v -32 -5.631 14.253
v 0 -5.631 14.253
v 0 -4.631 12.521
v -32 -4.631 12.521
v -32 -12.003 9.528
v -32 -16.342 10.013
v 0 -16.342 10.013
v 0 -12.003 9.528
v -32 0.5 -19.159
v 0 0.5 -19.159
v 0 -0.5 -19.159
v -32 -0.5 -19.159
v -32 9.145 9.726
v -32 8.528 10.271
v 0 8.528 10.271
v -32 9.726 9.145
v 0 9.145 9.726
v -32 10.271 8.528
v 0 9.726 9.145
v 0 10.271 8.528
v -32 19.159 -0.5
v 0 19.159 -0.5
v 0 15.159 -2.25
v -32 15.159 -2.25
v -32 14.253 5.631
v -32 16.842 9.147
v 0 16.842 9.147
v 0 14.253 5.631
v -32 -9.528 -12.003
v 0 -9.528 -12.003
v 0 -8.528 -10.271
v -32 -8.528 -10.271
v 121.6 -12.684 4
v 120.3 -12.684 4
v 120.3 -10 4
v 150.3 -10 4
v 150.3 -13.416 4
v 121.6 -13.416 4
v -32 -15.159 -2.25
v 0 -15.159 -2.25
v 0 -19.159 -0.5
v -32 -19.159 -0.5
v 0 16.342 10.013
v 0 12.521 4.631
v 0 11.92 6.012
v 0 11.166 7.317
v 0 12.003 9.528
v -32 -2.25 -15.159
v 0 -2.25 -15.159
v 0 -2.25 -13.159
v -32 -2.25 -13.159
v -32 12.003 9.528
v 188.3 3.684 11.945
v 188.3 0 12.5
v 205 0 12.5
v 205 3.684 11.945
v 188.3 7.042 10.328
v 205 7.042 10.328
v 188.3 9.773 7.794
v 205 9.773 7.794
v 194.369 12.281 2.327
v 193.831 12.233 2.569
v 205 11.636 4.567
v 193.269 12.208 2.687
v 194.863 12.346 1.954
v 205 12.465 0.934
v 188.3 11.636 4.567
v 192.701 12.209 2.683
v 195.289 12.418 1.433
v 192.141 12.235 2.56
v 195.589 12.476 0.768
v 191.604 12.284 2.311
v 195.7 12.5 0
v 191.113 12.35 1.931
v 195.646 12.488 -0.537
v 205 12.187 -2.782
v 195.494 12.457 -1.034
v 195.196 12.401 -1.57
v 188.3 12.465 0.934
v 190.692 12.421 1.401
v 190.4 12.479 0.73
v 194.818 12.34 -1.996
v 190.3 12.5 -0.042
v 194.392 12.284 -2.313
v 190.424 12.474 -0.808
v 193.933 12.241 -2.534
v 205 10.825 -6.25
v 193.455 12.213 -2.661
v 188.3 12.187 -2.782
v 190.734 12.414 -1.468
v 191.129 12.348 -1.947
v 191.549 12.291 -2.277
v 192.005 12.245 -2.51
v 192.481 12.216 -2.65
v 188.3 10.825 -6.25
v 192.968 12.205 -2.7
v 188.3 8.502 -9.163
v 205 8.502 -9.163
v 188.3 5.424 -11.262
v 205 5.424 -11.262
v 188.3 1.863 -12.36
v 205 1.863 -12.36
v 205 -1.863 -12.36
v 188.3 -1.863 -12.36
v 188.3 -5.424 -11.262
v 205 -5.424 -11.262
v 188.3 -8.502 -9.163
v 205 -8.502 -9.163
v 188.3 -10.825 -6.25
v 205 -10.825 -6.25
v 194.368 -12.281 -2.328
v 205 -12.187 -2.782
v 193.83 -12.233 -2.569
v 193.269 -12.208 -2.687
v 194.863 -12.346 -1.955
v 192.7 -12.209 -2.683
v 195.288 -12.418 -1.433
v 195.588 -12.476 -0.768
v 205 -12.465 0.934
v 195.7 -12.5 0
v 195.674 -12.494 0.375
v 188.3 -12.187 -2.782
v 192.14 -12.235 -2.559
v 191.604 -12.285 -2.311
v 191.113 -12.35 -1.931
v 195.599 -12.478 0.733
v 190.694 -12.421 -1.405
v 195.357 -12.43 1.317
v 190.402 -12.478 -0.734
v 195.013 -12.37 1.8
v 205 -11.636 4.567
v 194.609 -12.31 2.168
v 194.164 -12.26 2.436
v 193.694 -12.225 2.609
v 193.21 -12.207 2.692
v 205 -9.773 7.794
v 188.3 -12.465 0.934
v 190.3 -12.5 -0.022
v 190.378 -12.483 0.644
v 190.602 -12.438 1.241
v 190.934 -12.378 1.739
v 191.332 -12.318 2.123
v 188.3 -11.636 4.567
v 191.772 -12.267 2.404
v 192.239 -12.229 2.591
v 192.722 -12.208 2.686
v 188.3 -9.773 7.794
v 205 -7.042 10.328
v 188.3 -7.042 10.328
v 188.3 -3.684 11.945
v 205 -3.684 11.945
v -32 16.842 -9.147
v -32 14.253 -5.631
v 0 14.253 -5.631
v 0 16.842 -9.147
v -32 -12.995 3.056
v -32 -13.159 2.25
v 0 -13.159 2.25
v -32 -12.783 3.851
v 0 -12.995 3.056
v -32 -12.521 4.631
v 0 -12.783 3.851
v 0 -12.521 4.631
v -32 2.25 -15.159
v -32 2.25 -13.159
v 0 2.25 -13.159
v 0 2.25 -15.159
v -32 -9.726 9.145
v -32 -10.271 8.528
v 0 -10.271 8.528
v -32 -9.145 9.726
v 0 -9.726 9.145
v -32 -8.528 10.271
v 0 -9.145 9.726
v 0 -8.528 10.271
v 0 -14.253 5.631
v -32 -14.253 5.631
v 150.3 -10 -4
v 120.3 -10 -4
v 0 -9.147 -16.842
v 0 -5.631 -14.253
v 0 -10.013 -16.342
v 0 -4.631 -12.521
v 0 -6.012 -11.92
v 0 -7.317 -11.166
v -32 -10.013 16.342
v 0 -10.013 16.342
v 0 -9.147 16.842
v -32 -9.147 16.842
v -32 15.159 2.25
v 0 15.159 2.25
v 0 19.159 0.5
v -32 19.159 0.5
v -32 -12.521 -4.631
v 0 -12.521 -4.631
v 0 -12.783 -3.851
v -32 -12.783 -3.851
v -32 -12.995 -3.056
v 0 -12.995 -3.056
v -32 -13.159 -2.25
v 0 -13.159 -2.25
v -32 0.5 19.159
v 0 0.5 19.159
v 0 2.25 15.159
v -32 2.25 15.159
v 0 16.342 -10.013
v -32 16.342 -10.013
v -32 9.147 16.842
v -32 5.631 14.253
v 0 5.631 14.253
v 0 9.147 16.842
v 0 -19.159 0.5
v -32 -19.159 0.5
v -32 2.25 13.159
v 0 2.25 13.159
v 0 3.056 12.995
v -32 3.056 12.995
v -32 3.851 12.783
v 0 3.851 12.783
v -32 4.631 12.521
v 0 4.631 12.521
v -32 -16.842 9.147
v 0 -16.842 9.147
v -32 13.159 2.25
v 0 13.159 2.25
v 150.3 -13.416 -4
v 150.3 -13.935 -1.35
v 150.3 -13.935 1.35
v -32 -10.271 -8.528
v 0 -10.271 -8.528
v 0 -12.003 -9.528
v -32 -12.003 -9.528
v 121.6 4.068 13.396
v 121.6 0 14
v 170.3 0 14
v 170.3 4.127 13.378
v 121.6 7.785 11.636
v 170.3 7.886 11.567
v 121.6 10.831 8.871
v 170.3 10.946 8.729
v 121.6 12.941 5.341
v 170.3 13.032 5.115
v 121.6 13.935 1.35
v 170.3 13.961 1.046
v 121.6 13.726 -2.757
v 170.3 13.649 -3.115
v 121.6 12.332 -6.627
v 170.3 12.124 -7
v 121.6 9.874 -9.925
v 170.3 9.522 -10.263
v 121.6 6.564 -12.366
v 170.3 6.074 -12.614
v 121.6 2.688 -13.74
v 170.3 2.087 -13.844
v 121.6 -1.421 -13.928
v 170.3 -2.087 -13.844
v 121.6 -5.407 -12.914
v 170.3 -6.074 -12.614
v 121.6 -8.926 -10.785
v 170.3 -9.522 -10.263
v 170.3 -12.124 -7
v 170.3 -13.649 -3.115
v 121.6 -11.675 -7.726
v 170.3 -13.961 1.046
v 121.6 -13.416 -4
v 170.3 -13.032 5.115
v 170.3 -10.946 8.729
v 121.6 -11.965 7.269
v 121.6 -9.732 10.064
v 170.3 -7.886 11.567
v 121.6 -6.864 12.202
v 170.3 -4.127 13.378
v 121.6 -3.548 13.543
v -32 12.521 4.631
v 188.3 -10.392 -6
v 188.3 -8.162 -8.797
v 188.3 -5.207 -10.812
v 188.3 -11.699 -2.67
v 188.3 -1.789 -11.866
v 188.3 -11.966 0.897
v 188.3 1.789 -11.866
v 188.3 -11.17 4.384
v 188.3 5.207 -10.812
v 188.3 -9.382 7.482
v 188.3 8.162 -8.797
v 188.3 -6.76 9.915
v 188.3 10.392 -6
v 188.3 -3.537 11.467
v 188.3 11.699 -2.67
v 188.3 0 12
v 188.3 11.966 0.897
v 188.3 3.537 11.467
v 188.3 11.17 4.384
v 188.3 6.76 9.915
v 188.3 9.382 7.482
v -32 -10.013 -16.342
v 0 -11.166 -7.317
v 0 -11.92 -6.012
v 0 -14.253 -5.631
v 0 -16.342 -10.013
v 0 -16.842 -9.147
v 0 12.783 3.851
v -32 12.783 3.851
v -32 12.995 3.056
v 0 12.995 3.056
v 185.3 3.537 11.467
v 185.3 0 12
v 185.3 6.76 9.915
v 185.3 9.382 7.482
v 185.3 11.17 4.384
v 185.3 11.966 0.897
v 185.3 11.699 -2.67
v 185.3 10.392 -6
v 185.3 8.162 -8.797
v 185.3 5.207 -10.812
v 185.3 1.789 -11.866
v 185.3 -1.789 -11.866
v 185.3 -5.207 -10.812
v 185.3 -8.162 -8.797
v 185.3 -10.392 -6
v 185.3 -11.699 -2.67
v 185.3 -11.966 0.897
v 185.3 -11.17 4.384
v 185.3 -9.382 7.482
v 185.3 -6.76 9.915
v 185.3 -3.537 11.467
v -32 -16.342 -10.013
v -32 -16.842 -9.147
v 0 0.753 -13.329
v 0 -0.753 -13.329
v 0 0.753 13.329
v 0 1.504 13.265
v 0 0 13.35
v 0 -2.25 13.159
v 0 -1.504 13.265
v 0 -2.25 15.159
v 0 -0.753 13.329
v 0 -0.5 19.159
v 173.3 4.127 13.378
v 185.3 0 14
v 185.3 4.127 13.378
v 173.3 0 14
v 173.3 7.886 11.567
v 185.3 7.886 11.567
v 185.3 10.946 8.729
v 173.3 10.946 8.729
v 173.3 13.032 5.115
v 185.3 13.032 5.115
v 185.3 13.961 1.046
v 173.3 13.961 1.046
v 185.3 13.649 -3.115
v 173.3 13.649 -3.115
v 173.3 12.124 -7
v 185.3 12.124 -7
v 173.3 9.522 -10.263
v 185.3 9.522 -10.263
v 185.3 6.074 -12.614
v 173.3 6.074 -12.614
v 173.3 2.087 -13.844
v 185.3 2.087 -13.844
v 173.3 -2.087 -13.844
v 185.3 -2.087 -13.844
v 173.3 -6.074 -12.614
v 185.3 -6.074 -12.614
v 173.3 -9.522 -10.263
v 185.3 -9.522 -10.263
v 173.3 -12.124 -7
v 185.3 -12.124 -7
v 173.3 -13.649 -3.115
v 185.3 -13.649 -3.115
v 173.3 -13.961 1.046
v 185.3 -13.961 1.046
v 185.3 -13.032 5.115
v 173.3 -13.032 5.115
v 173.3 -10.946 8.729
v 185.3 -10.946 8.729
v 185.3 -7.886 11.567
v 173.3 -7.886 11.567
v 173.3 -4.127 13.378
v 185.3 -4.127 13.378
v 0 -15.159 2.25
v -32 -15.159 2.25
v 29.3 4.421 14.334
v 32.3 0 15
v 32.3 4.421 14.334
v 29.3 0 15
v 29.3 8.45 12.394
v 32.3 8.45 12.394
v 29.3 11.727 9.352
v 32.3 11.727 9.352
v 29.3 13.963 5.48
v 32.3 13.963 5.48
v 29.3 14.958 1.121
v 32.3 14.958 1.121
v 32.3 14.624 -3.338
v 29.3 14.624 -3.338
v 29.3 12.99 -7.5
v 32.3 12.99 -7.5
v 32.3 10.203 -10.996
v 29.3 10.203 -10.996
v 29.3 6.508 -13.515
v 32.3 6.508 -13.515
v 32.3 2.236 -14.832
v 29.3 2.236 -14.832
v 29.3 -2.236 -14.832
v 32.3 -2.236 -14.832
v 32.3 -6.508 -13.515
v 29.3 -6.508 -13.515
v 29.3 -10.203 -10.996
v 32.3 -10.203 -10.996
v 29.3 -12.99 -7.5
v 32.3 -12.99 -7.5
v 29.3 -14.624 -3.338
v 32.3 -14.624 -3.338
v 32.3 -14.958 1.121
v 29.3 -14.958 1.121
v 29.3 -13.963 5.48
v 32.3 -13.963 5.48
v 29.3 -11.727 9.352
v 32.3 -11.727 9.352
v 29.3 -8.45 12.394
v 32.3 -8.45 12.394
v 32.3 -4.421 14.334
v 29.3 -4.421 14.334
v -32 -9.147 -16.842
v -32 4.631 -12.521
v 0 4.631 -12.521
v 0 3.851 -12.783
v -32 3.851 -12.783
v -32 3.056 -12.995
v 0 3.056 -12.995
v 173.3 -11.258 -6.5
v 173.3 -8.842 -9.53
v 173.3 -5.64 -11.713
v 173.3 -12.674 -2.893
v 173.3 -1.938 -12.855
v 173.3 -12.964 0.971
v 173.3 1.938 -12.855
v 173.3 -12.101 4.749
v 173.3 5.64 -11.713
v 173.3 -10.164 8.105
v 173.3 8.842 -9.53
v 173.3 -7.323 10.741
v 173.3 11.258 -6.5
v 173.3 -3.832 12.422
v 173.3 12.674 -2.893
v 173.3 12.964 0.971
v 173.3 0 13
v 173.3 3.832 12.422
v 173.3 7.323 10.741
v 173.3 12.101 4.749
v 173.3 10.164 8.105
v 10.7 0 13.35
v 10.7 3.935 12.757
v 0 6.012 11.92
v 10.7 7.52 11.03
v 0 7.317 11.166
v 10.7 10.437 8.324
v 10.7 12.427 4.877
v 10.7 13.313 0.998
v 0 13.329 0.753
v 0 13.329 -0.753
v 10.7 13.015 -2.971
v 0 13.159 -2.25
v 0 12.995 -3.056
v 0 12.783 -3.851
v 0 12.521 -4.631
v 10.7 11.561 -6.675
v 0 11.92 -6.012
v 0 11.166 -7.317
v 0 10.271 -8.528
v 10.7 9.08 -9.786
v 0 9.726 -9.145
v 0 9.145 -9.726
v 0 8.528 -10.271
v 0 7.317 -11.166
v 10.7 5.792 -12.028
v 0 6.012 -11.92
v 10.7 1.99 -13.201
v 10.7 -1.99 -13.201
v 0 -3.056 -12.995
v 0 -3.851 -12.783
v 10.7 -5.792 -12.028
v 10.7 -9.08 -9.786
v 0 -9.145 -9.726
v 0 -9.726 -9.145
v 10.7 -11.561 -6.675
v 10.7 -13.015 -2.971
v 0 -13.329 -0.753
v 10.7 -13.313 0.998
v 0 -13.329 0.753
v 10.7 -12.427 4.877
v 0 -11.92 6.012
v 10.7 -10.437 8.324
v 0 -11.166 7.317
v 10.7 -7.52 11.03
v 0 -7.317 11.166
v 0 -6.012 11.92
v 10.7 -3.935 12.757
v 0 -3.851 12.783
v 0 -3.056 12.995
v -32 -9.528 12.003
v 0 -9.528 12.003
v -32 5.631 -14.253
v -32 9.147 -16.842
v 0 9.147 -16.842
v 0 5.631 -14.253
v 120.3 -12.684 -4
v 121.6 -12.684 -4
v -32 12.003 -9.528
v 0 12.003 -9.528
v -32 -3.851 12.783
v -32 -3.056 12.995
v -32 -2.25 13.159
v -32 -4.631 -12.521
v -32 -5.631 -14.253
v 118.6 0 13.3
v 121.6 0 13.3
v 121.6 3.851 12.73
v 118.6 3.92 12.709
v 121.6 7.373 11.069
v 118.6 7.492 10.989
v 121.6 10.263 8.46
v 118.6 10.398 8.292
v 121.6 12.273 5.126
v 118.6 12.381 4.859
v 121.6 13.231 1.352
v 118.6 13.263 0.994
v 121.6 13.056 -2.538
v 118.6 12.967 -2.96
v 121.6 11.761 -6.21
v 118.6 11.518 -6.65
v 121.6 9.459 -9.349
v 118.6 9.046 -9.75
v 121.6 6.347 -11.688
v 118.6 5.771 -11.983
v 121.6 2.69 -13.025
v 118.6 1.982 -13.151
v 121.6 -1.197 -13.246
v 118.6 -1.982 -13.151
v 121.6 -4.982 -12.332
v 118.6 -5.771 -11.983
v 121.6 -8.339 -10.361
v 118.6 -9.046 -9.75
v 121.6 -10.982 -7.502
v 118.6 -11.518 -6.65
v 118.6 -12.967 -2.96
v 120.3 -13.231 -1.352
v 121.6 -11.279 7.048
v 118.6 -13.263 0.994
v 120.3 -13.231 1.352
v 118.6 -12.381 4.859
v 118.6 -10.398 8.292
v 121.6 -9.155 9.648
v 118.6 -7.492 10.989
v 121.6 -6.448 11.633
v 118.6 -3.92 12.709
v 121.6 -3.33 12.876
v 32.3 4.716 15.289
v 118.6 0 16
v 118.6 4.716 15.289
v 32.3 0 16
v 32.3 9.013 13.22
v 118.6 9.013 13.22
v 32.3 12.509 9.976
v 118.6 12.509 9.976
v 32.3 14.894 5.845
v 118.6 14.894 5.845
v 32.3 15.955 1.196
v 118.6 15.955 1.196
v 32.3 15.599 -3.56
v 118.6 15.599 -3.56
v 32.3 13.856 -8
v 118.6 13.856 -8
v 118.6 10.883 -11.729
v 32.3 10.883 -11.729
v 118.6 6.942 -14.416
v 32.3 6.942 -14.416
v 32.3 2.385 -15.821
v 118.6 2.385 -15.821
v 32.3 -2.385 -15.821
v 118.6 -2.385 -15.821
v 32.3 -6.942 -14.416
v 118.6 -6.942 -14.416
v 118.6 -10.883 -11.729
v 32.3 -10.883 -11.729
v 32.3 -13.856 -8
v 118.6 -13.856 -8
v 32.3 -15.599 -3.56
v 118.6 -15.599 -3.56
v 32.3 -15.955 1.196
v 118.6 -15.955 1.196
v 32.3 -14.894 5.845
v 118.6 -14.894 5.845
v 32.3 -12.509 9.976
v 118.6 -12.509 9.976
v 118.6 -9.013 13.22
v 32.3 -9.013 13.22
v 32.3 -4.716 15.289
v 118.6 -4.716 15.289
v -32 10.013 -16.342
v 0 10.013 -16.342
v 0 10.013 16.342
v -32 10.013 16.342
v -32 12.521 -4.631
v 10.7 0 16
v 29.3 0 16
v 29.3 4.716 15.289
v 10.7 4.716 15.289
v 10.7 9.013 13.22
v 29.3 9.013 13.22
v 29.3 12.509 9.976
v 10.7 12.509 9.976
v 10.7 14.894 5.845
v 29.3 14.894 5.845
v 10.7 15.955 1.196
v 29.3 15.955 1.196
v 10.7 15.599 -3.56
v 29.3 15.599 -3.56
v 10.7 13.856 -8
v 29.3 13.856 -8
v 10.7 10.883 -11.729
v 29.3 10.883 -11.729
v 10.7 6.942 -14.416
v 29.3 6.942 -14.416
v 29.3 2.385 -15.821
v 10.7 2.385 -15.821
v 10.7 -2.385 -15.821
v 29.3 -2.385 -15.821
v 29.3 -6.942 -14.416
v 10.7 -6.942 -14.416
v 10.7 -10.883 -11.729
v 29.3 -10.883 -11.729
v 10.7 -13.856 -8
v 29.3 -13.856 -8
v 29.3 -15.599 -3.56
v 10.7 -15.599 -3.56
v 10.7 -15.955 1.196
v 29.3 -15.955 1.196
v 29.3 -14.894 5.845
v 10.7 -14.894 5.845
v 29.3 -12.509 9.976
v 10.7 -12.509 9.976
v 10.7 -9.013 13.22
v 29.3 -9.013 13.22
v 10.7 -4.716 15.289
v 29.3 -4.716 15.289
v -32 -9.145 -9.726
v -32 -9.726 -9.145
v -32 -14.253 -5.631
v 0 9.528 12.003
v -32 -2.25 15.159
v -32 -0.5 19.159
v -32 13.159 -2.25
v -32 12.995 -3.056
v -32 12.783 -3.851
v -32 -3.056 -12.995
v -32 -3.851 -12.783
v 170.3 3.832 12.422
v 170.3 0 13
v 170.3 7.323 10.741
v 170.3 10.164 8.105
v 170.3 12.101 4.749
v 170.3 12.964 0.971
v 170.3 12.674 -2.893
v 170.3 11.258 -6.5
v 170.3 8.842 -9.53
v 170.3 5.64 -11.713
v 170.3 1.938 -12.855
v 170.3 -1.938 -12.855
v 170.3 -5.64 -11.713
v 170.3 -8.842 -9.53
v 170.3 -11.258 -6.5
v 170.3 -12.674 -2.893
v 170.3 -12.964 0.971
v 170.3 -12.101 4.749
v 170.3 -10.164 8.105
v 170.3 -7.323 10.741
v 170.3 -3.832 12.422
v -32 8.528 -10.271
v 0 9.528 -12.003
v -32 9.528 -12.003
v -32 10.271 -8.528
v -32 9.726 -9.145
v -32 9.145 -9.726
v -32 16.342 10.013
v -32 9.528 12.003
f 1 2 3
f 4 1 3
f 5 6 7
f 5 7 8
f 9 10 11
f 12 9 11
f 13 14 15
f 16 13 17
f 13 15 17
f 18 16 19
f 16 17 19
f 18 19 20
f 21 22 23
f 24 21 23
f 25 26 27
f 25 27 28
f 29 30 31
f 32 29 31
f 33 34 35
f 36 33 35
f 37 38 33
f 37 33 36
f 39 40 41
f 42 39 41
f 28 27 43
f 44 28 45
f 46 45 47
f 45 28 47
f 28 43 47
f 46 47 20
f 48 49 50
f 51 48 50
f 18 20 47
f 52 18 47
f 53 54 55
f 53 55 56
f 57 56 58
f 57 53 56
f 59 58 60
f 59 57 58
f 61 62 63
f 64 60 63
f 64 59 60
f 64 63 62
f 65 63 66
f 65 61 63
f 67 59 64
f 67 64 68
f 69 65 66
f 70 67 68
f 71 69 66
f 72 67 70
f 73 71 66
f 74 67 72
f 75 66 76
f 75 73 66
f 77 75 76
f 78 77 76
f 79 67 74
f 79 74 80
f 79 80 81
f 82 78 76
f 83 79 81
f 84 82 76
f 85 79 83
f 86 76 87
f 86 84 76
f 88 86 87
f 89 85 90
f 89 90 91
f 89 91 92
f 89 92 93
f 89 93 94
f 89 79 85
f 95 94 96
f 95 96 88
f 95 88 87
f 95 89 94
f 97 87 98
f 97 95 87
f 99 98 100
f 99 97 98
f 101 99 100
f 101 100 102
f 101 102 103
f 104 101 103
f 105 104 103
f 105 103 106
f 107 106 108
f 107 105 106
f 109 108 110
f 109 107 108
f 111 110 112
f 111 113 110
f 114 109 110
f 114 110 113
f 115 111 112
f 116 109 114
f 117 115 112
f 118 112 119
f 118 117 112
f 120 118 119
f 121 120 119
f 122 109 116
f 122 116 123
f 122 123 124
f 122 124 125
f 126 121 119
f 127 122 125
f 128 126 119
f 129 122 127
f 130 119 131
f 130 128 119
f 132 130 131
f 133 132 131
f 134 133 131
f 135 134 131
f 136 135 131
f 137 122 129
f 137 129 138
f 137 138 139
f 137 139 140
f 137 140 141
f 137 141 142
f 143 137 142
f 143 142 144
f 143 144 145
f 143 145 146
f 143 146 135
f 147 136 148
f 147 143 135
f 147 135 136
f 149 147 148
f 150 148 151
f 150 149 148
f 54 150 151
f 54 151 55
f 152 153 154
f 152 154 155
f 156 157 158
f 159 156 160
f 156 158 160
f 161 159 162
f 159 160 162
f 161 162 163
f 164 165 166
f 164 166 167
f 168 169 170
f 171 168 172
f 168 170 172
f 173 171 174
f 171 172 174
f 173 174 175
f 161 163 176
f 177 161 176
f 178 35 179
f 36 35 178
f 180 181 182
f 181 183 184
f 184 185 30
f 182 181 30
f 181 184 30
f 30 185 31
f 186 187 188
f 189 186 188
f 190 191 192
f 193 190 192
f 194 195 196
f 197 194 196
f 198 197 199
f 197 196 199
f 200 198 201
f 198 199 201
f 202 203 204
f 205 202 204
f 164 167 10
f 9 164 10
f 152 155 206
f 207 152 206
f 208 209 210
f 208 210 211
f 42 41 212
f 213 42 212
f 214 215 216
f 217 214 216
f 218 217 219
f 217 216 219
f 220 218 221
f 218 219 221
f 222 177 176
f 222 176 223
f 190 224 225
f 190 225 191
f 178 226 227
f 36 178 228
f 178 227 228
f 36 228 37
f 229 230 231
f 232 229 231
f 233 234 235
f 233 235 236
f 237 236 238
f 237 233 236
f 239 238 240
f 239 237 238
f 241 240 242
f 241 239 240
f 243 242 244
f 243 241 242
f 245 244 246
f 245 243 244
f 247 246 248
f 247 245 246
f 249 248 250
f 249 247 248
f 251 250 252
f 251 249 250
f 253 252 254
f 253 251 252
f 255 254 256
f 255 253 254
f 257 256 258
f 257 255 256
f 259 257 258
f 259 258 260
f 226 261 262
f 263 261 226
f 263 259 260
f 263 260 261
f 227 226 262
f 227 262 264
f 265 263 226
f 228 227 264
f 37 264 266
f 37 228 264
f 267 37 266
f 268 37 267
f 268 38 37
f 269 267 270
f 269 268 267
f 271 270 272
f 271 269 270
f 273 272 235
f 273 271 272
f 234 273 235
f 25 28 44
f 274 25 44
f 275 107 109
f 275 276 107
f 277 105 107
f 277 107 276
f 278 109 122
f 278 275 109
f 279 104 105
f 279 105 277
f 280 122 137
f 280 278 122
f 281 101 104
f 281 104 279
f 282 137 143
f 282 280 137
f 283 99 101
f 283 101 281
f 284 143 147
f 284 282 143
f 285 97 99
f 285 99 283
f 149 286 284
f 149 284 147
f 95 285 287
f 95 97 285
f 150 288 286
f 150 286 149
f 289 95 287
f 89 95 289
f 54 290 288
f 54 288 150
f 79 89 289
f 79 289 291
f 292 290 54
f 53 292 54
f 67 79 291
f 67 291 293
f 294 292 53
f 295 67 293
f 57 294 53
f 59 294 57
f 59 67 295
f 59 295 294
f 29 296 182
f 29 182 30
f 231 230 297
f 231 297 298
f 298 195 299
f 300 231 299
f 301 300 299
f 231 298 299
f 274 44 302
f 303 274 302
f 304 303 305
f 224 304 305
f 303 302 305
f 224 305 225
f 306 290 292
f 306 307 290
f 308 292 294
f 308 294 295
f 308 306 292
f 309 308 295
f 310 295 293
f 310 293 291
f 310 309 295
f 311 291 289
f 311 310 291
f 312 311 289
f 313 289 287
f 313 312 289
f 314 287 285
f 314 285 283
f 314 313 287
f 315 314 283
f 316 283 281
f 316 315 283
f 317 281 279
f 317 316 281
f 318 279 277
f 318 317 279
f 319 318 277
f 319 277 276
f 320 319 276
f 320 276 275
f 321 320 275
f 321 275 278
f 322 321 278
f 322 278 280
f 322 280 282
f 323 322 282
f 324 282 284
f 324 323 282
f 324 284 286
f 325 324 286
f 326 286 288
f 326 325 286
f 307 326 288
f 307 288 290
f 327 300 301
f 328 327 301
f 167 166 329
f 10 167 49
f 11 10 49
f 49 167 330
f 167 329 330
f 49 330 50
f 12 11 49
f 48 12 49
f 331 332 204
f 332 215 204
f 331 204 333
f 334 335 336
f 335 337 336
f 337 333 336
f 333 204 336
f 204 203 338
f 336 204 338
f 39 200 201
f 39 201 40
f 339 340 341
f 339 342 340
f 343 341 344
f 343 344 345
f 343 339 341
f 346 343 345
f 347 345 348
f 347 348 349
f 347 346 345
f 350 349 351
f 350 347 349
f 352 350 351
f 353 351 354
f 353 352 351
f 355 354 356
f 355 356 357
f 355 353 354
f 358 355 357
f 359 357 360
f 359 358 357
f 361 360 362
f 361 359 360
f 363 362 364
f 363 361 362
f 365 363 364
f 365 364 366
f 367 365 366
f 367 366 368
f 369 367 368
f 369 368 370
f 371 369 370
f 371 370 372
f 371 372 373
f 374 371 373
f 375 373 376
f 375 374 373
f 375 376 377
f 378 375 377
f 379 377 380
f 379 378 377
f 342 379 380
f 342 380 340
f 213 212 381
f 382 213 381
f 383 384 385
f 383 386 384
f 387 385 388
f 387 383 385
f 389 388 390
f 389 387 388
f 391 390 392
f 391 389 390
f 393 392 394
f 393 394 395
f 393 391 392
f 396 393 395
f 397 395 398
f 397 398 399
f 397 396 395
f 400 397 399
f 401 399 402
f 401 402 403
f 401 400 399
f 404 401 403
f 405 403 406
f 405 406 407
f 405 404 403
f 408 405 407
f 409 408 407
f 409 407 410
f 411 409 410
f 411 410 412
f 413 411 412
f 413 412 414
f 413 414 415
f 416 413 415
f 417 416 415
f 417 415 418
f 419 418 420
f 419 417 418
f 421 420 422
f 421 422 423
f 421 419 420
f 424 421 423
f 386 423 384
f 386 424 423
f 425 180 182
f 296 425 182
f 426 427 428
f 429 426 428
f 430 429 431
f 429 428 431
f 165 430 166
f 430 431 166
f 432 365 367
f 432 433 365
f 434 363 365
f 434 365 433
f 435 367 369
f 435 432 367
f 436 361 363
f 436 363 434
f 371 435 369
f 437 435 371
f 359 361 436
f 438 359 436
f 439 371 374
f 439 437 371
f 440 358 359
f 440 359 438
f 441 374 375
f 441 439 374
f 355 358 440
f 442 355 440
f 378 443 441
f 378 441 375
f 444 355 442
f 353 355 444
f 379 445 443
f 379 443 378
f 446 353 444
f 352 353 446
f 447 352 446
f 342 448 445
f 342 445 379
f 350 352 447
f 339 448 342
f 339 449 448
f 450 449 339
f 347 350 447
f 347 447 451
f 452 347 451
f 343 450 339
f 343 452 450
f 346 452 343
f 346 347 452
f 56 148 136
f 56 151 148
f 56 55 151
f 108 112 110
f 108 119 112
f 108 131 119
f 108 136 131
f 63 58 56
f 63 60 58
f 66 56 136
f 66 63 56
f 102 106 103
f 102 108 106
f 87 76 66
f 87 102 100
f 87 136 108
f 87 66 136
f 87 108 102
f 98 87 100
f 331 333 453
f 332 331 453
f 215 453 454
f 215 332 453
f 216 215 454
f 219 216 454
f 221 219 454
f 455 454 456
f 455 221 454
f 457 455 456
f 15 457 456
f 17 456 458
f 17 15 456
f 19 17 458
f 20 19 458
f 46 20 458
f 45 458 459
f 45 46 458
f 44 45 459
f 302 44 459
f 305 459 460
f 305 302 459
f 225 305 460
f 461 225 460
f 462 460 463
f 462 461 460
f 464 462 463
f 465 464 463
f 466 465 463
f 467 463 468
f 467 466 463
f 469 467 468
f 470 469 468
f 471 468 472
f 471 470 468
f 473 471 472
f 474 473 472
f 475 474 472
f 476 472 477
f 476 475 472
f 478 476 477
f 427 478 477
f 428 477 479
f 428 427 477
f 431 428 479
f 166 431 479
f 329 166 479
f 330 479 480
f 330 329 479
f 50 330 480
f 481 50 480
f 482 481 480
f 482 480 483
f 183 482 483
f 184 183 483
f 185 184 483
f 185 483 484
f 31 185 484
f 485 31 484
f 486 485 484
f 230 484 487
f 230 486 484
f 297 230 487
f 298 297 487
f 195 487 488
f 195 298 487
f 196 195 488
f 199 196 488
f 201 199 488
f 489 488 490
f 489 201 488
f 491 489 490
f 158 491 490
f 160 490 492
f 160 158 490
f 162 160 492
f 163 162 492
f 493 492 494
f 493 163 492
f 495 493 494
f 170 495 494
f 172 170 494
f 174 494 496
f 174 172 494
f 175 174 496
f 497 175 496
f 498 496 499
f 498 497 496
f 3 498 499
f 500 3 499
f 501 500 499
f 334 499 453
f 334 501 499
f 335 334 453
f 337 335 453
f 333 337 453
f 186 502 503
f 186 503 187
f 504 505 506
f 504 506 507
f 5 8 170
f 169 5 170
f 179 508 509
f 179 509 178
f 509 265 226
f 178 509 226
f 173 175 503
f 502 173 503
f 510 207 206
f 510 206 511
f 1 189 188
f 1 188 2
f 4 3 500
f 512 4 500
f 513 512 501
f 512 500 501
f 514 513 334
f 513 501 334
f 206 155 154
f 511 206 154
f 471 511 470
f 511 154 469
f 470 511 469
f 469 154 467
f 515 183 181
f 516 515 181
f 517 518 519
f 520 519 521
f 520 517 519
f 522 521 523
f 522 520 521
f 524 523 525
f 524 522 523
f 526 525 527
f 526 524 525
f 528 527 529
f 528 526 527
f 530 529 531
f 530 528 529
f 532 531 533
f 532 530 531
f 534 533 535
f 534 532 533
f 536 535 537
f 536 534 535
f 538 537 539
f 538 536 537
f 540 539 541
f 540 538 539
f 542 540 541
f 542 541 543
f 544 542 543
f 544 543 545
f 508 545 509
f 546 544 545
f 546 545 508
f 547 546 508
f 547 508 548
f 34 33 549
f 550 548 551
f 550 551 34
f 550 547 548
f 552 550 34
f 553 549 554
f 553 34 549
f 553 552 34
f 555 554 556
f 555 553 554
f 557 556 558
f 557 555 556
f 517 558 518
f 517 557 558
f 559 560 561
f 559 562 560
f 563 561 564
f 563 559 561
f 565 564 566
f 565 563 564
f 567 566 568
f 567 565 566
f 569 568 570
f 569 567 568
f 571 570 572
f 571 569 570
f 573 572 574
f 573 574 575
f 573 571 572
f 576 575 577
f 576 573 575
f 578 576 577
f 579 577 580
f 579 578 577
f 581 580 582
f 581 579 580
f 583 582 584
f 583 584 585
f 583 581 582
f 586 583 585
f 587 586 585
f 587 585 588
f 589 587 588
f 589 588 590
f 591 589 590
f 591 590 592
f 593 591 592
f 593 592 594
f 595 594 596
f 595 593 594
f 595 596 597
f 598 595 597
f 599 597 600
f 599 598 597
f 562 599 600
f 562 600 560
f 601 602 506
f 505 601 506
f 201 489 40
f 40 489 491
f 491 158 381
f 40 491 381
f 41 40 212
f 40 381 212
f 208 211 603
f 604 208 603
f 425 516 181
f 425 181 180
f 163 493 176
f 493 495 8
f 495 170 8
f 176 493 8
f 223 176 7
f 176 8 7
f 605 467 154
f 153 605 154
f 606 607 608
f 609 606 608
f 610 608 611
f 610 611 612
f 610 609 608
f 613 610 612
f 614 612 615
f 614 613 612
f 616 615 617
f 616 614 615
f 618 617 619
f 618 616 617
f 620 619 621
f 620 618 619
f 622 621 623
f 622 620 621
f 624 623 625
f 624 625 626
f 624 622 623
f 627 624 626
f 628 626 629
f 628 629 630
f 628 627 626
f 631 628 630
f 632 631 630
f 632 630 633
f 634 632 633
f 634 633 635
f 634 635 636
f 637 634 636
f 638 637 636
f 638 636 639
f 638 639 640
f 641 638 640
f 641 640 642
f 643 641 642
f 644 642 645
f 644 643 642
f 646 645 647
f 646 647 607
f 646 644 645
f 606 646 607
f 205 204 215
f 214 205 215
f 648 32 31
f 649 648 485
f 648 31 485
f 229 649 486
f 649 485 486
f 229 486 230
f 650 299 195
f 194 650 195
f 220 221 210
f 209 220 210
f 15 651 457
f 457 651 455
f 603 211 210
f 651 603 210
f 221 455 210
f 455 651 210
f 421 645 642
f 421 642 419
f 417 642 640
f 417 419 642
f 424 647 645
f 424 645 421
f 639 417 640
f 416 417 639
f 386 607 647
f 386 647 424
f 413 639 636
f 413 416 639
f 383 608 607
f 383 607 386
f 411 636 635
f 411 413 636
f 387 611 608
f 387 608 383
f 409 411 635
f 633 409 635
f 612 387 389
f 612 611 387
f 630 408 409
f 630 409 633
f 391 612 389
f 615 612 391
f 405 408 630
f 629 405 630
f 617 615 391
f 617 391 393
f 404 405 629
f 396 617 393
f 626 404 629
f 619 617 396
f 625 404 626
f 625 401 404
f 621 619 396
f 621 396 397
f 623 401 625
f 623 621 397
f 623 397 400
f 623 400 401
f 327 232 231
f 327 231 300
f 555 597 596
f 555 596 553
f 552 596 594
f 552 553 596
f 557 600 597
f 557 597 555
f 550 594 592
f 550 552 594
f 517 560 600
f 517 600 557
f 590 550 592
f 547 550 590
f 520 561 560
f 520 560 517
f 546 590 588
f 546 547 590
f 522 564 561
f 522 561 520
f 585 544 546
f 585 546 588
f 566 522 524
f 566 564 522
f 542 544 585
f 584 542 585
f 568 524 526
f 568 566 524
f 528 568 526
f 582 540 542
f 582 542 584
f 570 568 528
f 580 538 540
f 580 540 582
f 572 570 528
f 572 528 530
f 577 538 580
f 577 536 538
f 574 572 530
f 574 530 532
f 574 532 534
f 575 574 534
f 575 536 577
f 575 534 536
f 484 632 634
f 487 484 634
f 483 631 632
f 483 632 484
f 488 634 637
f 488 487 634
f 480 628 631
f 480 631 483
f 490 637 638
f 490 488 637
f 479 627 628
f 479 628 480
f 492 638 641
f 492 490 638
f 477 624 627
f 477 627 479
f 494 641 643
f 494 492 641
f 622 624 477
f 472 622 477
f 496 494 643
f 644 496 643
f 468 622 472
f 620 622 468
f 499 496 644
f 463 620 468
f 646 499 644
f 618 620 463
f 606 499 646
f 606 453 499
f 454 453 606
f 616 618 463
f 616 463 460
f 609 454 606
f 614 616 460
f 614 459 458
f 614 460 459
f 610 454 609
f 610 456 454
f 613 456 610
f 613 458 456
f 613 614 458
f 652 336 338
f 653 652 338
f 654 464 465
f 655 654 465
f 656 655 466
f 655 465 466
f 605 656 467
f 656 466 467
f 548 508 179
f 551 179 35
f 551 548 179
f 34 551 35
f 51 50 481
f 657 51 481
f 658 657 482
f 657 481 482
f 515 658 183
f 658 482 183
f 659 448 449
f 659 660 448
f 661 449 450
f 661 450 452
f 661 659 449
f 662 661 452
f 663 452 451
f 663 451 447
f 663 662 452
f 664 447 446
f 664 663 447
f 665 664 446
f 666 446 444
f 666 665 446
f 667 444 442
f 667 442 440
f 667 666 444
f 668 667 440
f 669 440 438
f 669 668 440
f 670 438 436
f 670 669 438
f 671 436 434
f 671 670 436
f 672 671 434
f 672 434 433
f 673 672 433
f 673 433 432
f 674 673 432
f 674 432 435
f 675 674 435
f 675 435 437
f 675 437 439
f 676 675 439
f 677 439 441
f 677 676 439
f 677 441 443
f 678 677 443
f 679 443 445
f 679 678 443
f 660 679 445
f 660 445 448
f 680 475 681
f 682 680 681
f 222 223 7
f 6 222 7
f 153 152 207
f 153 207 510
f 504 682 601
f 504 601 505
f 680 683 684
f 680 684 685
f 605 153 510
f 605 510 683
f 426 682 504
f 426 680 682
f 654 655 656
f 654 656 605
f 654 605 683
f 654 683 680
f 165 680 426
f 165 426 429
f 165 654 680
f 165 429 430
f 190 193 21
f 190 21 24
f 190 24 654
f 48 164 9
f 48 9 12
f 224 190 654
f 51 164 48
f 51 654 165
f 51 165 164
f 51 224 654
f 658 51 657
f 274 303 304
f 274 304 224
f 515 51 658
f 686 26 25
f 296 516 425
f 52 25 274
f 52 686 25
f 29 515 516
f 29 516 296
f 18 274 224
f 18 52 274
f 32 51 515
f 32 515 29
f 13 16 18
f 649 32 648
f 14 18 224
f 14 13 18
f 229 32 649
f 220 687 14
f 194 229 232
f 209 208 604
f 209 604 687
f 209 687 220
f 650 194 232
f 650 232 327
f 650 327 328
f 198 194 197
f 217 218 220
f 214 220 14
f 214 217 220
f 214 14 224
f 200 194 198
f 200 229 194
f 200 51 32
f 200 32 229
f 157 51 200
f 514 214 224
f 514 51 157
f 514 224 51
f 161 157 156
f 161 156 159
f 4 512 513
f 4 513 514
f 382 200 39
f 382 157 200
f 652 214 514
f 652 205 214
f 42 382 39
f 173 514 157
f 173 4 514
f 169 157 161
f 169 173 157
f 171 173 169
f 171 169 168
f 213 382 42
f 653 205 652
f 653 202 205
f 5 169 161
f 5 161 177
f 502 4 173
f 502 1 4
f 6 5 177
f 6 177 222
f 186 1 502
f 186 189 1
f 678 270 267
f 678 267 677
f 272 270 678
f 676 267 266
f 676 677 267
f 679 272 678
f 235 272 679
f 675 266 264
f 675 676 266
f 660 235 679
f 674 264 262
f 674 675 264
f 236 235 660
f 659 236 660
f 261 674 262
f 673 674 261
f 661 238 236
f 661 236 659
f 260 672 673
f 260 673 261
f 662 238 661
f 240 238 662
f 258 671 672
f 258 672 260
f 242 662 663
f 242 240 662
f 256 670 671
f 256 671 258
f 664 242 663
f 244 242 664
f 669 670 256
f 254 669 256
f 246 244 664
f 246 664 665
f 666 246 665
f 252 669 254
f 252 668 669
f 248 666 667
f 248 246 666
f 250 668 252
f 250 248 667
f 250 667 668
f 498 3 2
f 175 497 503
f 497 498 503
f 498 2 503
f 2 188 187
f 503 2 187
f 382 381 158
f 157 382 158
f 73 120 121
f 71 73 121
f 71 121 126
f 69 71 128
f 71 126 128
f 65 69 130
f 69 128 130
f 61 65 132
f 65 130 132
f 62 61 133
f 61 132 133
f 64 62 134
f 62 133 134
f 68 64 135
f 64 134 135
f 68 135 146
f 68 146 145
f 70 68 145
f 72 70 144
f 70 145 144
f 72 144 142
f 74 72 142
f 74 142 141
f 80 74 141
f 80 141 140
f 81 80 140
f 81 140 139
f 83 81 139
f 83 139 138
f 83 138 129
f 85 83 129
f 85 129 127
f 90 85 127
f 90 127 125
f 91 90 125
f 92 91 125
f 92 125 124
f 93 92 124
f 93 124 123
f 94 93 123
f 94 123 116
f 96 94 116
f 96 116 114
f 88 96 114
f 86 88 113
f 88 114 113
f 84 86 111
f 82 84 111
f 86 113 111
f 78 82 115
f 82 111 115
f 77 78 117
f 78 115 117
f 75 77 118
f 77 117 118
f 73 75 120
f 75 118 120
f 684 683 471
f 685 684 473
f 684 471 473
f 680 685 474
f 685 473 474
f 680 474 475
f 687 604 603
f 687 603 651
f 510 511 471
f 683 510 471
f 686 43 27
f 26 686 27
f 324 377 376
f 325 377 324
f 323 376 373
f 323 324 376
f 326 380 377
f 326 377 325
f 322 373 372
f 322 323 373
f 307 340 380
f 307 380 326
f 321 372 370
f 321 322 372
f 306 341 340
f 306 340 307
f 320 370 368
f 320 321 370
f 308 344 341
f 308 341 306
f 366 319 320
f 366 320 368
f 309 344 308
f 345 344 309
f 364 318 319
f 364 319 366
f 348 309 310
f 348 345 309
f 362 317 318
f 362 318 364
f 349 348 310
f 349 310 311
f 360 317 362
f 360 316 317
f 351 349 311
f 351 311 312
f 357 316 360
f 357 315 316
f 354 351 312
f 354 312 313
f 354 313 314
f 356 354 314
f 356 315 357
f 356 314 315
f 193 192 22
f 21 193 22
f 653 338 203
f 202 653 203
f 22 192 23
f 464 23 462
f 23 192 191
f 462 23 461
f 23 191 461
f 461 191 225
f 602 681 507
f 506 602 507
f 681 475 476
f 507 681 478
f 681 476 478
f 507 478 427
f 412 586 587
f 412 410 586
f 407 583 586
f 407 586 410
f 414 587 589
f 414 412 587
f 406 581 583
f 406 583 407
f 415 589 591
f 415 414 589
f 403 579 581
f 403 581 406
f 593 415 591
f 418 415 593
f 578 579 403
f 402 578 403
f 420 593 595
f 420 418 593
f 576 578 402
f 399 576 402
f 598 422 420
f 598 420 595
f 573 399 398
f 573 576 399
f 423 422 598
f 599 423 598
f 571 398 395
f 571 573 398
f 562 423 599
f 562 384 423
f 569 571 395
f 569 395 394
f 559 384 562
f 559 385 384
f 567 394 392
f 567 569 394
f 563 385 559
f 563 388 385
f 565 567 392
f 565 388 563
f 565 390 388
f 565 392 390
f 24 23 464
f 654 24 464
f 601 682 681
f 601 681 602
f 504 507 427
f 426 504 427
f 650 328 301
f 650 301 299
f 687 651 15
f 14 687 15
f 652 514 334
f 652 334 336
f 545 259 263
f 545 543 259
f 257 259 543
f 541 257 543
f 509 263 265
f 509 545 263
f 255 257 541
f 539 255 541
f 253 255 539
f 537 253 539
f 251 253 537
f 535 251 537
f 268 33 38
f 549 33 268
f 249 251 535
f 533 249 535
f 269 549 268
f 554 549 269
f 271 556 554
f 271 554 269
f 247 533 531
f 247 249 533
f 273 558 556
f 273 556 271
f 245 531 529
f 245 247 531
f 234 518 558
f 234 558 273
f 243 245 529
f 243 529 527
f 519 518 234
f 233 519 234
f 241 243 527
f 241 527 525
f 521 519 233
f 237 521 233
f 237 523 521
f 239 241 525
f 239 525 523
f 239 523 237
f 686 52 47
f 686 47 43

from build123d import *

# Parameters (mm, degrees)
F3_DEPTH = 32
F7_W     = 30
F7_H     = 8
F8_DEPTH = 4
F5_R     = 2.7
F9_DEPTH = 25


with BuildPart() as f1:
    # F0 (on Front) → F1 (revolve)
    with BuildSketch(Plane.XZ):
        Polygon((29.3, 16), (10.7, 16), (10.7, 13.35), (0, 13.35), (0, 0), (205, 0), (205, 12.5), (188.3, 12.5), (188.3, 12), (185.3, 12), (185.3, 14), (173.3, 14), (173.3, 13), (170.3, 13), (170.3, 14), (121.6, 14), (121.6, 13.3), (118.6, 13.3), (118.6, 16), (32.3, 16), (32.3, 15), (29.3, 15), align=None)
    revolve(axis=Axis((102.5, 0, 0), (-1, 0, 0)))

    # F2 (on face) → F3 (join)
    with BuildSketch(Plane(origin=(0, 0, 0), x_dir=(0, -1, 0), z_dir=(-1, 0, 0))):
        with BuildLine():
            ThreePointArc((-8.528071, 10.271052), (-6.675, 11.561439), (-4.630957, 12.521052))
            Line((-4.630957, 12.521052), (-5.630957, 14.253103))
            Line((-5.630957, 14.253103), (-9.146501, 16.842204))
            Line((-9.146501, 16.842204), (-10.012526, 16.342204))
            Line((-10.012526, 16.342204), (-9.528071, 12.003103))
            Line((-9.528071, 12.003103), (-8.528071, 10.271052))
        make_face()
        with BuildLine():
            Line((-2.25, 15.159027), (-2.25, 13.159027))
            ThreePointArc((-2.25, 13.159027), (0, 13.35), (2.25, 13.159027))
            Line((2.25, 13.159027), (2.25, 15.159027))
            Line((2.25, 15.159027), (0.5, 19.159027))
            Line((0.5, 19.159027), (-0.5, 19.159027))
            Line((-0.5, 19.159027), (-2.25, 15.159027))
        make_face()
        with BuildLine():
            Line((5.630957, 14.253103), (4.630957, 12.521052))
            ThreePointArc((4.630957, 12.521052), (6.675, 11.561439), (8.528071, 10.271052))
            Line((8.528071, 10.271052), (9.528071, 12.003103))
            Line((9.528071, 12.003103), (10.012526, 16.342204))
            Line((10.012526, 16.342204), (9.146501, 16.842204))
            Line((9.146501, 16.842204), (5.630957, 14.253103))
        make_face()
        with BuildLine():
            Line((12.003103, 9.528071), (10.271052, 8.528071))
            ThreePointArc((10.271052, 8.528071), (11.561439, 6.675), (12.521052, 4.630957))
            Line((12.521052, 4.630957), (14.253103, 5.630957))
            Line((14.253103, 5.630957), (16.842204, 9.146501))
            Line((16.842204, 9.146501), (16.342204, 10.012526))
            Line((16.342204, 10.012526), (12.003103, 9.528071))
        make_face()
        with BuildLine():
            Line((15.159027, 2.25), (13.159027, 2.25))
            ThreePointArc((13.159027, 2.25), (13.302171, 1.129045), (13.35, 0))
            ThreePointArc((13.35, 0), (13.302171, -1.129045), (13.159027, -2.25))
            Line((13.159027, -2.25), (15.159027, -2.25))
            Line((15.159027, -2.25), (19.159027, -0.5))
            Line((19.159027, -0.5), (19.159027, 0.5))
            Line((19.159027, 0.5), (15.159027, 2.25))
        make_face()
        with BuildLine():
            Line((14.253103, -5.630957), (12.521052, -4.630957))
            ThreePointArc((12.521052, -4.630957), (11.561439, -6.675), (10.271052, -8.528071))
            Line((10.271052, -8.528071), (12.003103, -9.528071))
            Line((12.003103, -9.528071), (16.342204, -10.012526))
            Line((16.342204, -10.012526), (16.842204, -9.146501))
            Line((16.842204, -9.146501), (14.253103, -5.630957))
        make_face()
        with BuildLine():
            Line((9.528071, -12.003103), (8.528071, -10.271052))
            ThreePointArc((8.528071, -10.271052), (6.675, -11.561439), (4.630957, -12.521052))
            Line((4.630957, -12.521052), (5.630957, -14.253103))
            Line((5.630957, -14.253103), (9.146501, -16.842204))
            Line((9.146501, -16.842204), (10.012526, -16.342204))
            Line((10.012526, -16.342204), (9.528071, -12.003103))
        make_face()
        with BuildLine():
            ThreePointArc((2.25, -13.159027), (0, -13.35), (-2.25, -13.159027))
            Line((-2.25, -13.159027), (-2.25, -15.159027))
            Line((-2.25, -15.159027), (-0.5, -19.159027))
            Line((-0.5, -19.159027), (0.5, -19.159027))
            Line((0.5, -19.159027), (2.25, -15.159027))
            Line((2.25, -15.159027), (2.25, -13.159027))
        make_face()
        with BuildLine():
            ThreePointArc((-4.630957, -12.521052), (-6.675, -11.561439), (-8.528071, -10.271052))
            Line((-8.528071, -10.271052), (-9.528071, -12.003103))
            Line((-9.528071, -12.003103), (-10.012526, -16.342204))
            Line((-10.012526, -16.342204), (-9.146501, -16.842204))
            Line((-9.146501, -16.842204), (-5.630957, -14.253103))
            Line((-5.630957, -14.253103), (-4.630957, -12.521052))
        make_face()
        with BuildLine():
            ThreePointArc((-10.271052, -8.528071), (-11.561439, -6.675), (-12.521052, -4.630957))
            Line((-12.521052, -4.630957), (-14.253103, -5.630957))
            Line((-14.253103, -5.630957), (-16.842204, -9.146501))
            Line((-16.842204, -9.146501), (-16.342204, -10.012526))
            Line((-16.342204, -10.012526), (-12.003103, -9.528071))
            Line((-12.003103, -9.528071), (-10.271052, -8.528071))
        make_face()
        with BuildLine():
            ThreePointArc((-13.159027, -2.25), (-13.35, 0), (-13.159027, 2.25))
            Line((-13.159027, 2.25), (-15.159027, 2.25))
            Line((-15.159027, 2.25), (-19.159027, 0.5))
            Line((-19.159027, 0.5), (-19.159027, -0.5))
            Line((-19.159027, -0.5), (-15.159027, -2.25))
            Line((-15.159027, -2.25), (-13.159027, -2.25))
        make_face()
        with BuildLine():
            ThreePointArc((-12.521052, 4.630957), (-11.561439, 6.675), (-10.271052, 8.528071))
            Line((-10.271052, 8.528071), (-12.003103, 9.528071))
            Line((-12.003103, 9.528071), (-16.342204, 10.012526))
            Line((-16.342204, 10.012526), (-16.842204, 9.146501))
            Line((-16.842204, 9.146501), (-14.253103, 5.630957))
            Line((-14.253103, 5.630957), (-12.521052, 4.630957))
        make_face()
        with BuildLine():
            ThreePointArc((2.25, 13.159027), (0, 13.35), (-2.25, 13.159027))
            ThreePointArc((-2.25, 13.159027), (-3.455234, 12.89511), (-4.630957, 12.521052))
            ThreePointArc((-4.630957, 12.521052), (-6.675, 11.561439), (-8.528071, 10.271052))
            ThreePointArc((-8.528071, 10.271052), (-9.439876, 9.439876), (-10.271052, 8.528071))
            ThreePointArc((-10.271052, 8.528071), (-11.561439, 6.675), (-12.521052, 4.630957))
            ThreePointArc((-12.521052, 4.630957), (-12.89511, 3.455234), (-13.159027, 2.25))
            ThreePointArc((-13.159027, 2.25), (-13.35, 0), (-13.159027, -2.25))
            ThreePointArc((-13.159027, -2.25), (-12.89511, -3.455234), (-12.521052, -4.630957))
            ThreePointArc((-12.521052, -4.630957), (-11.561439, -6.675), (-10.271052, -8.528071))
            ThreePointArc((-10.271052, -8.528071), (-9.439876, -9.439876), (-8.528071, -10.271052))
            ThreePointArc((-8.528071, -10.271052), (-6.675, -11.561439), (-4.630957, -12.521052))
            ThreePointArc((-4.630957, -12.521052), (-3.455234, -12.89511), (-2.25, -13.159027))
            ThreePointArc((-2.25, -13.159027), (0, -13.35), (2.25, -13.159027))
            ThreePointArc((2.25, -13.159027), (3.455234, -12.89511), (4.630957, -12.521052))
            ThreePointArc((4.630957, -12.521052), (6.675, -11.561439), (8.528071, -10.271052))
            ThreePointArc((8.528071, -10.271052), (9.439876, -9.439876), (10.271052, -8.528071))
            ThreePointArc((10.271052, -8.528071), (11.561439, -6.675), (12.521052, -4.630957))
            ThreePointArc((12.521052, -4.630957), (12.89511, -3.455234), (13.159027, -2.25))
            ThreePointArc((13.159027, -2.25), (13.302171, -1.129045), (13.35, 0))
            ThreePointArc((13.35, 0), (13.302171, 1.129045), (13.159027, 2.25))
            ThreePointArc((13.159027, 2.25), (12.89511, 3.455234), (12.521052, 4.630957))
            ThreePointArc((12.521052, 4.630957), (11.561439, 6.675), (10.271052, 8.528071))
            ThreePointArc((10.271052, 8.528071), (9.439876, 9.439876), (8.528071, 10.271052))
            ThreePointArc((8.528071, 10.271052), (6.675, 11.561439), (4.630957, 12.521052))
            ThreePointArc((4.630957, 12.521052), (3.455234, 12.89511), (2.25, 13.159027))
        make_face()
    extrude(amount=F3_DEPTH)

    # F7 (on offset) → F8 (cut)
    with BuildSketch(Plane.XZ.offset(14)):
        with Locations((135.3, 0)):
            Rectangle(F7_W, F7_H)
    extrude(amount=-F8_DEPTH, mode=Mode.SUBTRACT)

    # F5 (on offset) → F9 (cut)
    with BuildSketch(Plane.XZ.offset(12.5)):
        with Locations((193, 0)):
            Circle(F5_R)
    extrude(amount=-F9_DEPTH, mode=Mode.SUBTRACT)


solid = f1.part
